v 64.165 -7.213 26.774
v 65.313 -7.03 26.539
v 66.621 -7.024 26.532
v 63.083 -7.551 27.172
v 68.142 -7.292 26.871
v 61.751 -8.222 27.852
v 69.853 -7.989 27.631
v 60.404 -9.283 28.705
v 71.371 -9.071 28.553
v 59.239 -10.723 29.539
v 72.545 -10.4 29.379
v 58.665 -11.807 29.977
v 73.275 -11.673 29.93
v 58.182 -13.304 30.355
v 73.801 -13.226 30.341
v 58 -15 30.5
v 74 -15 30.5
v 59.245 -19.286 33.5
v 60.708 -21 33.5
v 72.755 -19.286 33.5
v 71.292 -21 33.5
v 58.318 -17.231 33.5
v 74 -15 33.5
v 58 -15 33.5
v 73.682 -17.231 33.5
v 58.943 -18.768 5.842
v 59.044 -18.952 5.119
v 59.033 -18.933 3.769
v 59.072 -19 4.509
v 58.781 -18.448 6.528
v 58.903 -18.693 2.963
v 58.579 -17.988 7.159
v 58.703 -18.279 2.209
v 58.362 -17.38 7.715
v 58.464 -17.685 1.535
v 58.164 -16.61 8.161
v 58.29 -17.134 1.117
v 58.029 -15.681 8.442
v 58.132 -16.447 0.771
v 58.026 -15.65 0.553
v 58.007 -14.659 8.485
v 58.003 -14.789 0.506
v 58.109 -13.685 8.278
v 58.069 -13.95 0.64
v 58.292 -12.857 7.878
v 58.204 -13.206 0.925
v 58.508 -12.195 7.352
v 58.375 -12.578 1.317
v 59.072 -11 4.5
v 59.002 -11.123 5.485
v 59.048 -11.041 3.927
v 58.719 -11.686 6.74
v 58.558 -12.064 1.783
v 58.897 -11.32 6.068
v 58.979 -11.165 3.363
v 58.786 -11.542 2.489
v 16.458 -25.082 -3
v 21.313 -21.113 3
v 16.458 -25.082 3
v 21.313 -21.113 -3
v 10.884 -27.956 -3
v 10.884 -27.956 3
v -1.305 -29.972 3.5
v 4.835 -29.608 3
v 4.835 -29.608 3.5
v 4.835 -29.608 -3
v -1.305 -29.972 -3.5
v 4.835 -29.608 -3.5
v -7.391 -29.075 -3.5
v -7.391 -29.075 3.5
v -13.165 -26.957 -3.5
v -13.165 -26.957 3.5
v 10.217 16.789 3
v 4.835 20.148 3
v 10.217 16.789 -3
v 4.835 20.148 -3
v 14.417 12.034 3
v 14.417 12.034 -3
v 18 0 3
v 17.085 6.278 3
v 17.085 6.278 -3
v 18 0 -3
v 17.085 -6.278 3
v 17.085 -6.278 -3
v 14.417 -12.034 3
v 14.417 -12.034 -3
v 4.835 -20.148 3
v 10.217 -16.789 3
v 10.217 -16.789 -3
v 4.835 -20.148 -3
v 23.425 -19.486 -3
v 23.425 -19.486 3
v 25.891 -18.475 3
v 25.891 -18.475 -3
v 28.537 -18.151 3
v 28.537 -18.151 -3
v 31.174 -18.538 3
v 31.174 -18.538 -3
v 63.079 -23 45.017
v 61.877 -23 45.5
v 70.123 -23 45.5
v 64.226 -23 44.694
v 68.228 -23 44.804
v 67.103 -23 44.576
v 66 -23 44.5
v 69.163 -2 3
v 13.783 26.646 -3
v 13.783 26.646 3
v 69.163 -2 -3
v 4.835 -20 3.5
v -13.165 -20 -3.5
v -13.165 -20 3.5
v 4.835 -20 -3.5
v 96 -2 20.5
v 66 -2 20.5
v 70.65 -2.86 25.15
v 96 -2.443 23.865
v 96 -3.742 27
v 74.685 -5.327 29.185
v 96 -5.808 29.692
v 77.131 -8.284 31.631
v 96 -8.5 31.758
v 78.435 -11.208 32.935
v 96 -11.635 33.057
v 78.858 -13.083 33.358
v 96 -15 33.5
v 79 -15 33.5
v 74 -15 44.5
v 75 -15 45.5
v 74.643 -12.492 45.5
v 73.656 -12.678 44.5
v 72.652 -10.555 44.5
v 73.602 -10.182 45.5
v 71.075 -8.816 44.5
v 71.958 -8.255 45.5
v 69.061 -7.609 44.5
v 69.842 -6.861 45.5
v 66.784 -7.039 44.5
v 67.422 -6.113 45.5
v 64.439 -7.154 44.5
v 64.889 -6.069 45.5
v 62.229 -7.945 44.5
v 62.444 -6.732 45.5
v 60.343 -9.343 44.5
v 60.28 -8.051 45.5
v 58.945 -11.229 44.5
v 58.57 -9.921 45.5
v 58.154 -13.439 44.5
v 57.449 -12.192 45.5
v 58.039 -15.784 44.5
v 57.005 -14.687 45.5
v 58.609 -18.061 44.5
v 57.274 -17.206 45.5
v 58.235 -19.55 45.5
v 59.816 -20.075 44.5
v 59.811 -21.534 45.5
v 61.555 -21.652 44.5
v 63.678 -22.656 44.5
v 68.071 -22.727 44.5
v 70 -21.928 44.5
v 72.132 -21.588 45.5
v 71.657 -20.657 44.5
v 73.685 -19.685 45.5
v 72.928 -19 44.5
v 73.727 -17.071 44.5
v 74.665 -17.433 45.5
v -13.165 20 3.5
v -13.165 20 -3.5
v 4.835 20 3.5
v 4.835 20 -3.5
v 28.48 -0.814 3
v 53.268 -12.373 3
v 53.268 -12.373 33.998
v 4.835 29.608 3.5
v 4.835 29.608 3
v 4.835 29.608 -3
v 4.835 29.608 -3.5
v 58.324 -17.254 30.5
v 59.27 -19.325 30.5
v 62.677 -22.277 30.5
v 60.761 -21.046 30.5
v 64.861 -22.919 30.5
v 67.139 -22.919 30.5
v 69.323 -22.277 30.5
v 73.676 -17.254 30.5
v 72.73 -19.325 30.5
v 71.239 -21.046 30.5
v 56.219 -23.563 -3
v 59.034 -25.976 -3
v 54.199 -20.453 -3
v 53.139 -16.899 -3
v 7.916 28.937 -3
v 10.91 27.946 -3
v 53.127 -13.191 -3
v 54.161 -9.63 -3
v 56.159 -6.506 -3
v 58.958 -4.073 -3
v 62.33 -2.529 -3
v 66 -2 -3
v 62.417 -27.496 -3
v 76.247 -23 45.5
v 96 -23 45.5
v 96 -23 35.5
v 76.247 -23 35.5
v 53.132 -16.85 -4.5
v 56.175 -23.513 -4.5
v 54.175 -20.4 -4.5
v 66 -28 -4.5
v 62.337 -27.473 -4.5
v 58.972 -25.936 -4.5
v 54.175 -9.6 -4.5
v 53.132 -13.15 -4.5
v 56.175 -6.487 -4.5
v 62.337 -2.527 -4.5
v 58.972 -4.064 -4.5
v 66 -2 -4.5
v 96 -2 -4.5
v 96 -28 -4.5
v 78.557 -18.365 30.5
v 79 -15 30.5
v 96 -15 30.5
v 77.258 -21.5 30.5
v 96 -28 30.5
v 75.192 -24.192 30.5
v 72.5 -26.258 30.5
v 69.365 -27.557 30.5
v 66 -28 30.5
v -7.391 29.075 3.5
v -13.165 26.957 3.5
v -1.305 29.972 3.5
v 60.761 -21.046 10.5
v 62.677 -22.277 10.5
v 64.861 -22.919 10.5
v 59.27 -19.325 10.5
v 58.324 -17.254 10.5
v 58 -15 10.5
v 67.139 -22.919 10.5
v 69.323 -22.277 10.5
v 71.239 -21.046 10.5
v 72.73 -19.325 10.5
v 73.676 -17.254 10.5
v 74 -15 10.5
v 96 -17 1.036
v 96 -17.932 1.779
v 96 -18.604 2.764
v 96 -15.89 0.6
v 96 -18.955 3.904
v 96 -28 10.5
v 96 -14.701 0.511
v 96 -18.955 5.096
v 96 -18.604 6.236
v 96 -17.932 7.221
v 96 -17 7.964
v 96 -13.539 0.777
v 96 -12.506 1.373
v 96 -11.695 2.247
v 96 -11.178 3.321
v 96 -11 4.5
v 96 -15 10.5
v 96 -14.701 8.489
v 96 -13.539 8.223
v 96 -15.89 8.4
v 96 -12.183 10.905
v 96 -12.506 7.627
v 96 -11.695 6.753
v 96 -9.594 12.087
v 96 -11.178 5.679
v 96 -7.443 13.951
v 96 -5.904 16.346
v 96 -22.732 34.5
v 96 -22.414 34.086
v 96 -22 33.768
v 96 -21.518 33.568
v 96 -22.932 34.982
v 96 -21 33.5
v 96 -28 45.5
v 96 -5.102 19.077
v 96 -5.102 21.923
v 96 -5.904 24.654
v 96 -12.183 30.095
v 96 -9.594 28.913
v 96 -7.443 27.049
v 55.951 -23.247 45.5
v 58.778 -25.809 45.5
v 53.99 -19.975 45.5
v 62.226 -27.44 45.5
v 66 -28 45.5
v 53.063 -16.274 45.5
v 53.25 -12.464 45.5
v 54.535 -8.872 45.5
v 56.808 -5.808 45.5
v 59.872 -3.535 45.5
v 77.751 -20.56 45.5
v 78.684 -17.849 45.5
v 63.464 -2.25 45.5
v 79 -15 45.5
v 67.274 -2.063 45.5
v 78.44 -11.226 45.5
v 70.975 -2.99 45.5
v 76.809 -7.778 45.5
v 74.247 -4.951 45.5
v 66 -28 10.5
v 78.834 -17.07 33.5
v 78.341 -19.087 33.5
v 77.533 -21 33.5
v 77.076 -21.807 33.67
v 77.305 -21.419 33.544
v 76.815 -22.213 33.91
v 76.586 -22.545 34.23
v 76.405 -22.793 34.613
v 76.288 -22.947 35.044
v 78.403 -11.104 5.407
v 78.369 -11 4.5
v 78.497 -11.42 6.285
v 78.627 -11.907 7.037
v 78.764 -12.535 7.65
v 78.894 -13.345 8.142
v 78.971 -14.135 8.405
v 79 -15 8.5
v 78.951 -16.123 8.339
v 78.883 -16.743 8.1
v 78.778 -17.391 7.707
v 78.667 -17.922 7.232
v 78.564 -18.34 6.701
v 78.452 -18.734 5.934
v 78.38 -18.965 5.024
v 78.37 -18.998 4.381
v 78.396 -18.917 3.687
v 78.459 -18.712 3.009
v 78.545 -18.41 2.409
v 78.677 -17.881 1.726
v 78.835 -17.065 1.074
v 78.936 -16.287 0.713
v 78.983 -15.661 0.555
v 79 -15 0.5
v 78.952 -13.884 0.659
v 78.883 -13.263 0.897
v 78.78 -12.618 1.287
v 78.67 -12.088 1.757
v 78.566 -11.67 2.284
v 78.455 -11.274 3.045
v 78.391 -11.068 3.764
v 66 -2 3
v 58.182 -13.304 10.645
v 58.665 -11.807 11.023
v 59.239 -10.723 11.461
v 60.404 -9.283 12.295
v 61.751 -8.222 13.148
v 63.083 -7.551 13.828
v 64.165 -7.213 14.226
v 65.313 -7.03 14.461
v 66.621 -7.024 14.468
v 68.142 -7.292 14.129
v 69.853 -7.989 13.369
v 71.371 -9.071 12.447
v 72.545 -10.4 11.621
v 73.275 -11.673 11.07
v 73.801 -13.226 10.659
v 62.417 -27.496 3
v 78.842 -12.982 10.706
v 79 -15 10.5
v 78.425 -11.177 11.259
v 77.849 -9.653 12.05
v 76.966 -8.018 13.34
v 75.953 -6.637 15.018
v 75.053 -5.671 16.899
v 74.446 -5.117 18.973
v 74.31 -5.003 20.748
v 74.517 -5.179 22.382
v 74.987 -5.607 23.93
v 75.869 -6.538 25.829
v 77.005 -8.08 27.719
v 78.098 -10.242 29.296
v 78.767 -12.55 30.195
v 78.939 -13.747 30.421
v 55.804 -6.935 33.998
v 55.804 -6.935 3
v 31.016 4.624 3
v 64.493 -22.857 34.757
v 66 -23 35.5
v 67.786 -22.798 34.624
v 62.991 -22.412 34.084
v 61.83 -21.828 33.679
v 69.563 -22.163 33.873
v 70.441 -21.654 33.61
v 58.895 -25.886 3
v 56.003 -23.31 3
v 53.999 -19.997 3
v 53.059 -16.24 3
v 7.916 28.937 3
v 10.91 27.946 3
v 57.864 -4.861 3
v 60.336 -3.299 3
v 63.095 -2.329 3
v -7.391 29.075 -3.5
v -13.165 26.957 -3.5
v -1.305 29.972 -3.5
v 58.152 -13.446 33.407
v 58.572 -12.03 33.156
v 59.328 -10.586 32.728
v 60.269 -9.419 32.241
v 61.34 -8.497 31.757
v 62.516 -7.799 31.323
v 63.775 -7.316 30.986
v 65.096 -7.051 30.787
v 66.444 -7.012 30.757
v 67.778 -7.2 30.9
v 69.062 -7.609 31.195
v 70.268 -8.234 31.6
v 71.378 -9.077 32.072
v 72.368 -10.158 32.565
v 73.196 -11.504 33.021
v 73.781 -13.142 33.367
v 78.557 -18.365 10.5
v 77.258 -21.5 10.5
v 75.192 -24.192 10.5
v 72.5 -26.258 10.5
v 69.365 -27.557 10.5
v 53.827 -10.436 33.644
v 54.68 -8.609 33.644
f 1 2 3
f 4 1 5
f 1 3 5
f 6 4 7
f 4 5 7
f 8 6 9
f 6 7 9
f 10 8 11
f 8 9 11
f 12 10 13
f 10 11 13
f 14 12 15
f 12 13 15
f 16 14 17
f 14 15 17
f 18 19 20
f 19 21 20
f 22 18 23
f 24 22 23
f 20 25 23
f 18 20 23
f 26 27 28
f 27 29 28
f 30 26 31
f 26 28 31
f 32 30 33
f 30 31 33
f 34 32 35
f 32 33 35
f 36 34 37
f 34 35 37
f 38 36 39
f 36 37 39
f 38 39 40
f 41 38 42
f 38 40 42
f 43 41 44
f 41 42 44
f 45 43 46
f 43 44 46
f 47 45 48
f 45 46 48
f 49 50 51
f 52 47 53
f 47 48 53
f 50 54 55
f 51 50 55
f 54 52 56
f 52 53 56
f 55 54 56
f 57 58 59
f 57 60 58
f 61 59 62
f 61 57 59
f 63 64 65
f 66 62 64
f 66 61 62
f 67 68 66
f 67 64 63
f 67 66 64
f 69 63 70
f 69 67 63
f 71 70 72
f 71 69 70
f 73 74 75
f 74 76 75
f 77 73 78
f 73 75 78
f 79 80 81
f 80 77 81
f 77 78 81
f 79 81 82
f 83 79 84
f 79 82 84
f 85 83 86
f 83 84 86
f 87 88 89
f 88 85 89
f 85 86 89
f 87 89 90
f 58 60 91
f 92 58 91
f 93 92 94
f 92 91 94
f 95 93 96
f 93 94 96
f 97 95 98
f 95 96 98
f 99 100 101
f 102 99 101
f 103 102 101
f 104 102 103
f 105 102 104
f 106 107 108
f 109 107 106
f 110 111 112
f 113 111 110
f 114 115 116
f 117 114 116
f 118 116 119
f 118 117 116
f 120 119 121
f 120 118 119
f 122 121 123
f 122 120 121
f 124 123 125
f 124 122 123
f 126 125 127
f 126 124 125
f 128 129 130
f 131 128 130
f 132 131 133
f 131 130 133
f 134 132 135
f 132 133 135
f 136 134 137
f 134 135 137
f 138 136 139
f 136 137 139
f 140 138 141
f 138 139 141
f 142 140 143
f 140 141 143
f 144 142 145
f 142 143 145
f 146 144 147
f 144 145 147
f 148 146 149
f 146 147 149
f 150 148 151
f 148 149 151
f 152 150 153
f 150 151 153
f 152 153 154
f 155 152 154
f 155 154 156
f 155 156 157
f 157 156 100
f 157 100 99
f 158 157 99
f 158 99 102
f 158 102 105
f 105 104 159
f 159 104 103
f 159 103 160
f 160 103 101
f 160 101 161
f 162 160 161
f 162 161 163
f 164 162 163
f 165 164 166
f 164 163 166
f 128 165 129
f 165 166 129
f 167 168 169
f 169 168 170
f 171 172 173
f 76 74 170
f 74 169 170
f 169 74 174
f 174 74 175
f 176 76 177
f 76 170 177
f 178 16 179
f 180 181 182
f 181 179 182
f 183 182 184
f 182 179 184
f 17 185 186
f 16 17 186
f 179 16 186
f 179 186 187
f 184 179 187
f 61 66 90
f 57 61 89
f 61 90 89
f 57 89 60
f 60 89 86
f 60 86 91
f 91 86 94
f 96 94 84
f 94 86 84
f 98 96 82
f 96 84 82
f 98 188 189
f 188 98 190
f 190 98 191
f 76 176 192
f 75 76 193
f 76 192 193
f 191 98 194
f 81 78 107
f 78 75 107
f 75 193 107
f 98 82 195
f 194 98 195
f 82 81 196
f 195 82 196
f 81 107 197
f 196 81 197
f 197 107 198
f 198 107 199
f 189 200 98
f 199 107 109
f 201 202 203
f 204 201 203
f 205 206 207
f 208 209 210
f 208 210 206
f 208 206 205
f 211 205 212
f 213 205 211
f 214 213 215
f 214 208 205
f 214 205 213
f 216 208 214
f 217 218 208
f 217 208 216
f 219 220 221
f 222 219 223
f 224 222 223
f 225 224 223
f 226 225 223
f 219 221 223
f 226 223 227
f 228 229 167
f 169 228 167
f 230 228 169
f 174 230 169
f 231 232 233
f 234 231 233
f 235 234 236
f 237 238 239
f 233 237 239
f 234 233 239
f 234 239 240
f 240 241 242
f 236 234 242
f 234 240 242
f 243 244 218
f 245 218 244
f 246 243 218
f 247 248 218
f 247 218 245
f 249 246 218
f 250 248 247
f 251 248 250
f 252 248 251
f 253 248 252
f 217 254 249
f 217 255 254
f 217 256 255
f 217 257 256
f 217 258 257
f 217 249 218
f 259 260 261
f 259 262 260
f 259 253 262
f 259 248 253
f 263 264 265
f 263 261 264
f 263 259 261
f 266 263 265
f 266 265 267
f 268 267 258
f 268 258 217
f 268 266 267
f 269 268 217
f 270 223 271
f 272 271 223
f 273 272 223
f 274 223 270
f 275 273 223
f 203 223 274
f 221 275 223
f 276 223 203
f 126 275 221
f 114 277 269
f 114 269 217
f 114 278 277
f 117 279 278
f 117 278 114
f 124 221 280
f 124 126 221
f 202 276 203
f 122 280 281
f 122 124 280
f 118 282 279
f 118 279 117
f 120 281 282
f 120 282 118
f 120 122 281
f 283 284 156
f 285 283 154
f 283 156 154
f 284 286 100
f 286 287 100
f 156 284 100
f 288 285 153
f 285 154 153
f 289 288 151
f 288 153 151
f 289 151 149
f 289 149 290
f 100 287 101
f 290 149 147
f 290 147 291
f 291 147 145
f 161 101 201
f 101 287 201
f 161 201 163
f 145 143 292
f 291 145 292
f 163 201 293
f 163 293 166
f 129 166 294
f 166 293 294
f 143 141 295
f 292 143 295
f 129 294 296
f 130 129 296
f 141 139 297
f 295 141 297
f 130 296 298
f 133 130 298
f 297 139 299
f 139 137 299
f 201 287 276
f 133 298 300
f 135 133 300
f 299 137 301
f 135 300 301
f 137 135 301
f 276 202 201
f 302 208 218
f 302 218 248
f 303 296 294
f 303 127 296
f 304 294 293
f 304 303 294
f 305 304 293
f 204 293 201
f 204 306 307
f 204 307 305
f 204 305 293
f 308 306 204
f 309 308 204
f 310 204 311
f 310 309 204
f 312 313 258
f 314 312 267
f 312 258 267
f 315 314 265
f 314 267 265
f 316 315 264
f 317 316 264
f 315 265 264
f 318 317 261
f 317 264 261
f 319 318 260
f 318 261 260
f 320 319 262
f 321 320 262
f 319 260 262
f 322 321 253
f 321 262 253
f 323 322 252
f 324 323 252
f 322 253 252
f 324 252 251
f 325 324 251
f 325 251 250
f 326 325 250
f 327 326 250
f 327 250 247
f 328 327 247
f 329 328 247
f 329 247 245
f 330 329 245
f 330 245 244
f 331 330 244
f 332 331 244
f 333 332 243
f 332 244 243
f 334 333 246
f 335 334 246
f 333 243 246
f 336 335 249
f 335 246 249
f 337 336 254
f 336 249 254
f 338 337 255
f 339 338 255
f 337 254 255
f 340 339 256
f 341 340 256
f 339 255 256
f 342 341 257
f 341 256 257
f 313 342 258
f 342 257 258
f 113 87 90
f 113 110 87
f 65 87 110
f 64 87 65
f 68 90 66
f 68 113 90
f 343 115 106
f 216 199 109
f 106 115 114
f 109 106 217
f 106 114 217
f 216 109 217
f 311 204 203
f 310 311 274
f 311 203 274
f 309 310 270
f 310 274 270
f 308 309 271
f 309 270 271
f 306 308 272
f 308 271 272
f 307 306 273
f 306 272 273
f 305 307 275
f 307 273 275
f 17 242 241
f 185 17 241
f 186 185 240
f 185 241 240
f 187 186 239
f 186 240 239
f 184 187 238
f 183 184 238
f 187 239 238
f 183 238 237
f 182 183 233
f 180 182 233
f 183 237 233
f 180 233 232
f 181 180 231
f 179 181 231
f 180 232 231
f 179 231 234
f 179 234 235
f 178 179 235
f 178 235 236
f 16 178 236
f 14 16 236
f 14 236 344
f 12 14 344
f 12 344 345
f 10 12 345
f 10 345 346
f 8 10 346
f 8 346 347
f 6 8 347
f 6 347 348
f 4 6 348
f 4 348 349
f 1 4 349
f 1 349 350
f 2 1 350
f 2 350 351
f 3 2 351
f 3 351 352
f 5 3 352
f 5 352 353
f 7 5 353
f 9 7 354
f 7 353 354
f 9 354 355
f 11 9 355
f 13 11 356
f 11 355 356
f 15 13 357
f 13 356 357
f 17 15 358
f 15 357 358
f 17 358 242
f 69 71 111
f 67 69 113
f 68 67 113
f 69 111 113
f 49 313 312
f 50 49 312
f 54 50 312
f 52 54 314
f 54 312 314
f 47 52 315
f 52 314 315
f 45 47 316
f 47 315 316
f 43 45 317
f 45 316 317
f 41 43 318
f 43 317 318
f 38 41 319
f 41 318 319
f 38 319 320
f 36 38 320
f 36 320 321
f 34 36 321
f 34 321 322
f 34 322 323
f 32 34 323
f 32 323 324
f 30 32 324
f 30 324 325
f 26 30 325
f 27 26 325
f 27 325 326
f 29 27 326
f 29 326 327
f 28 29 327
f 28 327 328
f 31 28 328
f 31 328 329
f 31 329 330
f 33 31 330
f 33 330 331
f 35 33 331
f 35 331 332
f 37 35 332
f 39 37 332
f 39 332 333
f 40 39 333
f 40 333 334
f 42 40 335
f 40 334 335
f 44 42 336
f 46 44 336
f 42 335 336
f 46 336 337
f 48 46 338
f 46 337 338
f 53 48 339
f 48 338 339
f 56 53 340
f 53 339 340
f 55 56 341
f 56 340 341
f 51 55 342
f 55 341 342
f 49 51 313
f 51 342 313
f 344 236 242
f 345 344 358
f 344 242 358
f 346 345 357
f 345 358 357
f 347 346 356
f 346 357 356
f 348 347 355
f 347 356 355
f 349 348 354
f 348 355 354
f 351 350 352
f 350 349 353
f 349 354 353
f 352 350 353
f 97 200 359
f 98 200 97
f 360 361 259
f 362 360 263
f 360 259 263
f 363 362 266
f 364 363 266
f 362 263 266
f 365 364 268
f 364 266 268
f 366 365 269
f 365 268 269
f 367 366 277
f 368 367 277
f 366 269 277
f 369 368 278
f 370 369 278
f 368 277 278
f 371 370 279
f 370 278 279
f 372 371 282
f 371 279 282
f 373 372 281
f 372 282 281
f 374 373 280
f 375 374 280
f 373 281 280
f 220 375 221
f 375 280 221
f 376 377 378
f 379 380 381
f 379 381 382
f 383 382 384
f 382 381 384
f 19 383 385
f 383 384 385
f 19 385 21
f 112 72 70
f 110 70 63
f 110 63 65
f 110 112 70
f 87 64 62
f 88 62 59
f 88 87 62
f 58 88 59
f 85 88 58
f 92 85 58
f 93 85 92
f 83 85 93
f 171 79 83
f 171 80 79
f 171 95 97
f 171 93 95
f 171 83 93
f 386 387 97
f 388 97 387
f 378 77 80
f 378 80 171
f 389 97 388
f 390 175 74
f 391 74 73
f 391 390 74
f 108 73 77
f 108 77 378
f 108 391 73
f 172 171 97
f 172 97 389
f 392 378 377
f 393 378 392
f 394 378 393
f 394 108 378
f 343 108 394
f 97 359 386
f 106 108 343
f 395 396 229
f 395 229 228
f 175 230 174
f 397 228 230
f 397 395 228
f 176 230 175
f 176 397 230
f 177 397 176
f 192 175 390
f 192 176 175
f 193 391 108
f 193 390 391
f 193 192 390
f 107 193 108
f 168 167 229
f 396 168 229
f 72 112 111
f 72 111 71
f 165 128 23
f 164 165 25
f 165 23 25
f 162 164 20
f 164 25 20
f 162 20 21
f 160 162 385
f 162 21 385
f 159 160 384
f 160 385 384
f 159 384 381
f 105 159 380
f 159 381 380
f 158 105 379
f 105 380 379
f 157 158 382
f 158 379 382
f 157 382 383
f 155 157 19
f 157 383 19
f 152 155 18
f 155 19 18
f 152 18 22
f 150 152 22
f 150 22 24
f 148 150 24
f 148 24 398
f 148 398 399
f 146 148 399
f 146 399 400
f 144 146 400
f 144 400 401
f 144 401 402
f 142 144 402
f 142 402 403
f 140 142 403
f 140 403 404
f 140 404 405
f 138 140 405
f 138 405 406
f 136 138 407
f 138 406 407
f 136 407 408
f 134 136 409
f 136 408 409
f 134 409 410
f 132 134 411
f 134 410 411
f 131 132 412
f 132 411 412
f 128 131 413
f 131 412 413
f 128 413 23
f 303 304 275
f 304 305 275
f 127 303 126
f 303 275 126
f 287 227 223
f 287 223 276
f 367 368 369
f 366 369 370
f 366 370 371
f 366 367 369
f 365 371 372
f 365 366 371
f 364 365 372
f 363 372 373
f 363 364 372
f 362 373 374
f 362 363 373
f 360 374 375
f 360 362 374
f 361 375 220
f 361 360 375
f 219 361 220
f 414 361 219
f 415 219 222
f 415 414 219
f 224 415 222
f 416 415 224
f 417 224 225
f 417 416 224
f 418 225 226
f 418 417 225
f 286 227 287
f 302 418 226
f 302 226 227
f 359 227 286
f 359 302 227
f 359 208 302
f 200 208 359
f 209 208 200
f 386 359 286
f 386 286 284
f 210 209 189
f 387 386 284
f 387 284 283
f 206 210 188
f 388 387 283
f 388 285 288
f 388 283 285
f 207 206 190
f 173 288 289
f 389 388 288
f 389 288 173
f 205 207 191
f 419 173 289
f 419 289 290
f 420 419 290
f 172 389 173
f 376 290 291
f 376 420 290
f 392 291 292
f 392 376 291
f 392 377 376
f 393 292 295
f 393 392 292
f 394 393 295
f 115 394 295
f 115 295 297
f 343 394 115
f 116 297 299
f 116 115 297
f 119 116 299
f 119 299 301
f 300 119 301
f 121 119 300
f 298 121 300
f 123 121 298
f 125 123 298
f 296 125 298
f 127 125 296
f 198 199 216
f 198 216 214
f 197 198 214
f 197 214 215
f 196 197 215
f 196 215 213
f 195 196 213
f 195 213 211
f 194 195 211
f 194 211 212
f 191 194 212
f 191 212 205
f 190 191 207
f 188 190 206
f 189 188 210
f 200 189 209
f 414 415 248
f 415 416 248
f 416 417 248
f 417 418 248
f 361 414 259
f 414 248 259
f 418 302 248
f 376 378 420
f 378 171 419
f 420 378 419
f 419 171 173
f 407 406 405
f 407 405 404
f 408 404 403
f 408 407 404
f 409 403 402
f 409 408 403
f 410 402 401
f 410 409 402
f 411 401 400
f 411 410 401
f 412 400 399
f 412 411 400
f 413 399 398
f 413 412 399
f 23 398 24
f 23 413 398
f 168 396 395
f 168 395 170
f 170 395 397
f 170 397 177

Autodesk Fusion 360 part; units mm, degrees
sketch "草图1" plane through (0, 0, 0) normal (0, 0, 1) x (1, 0, 0)
  line L0 (-13.1652, 20) -> (4.8348, 20)
  line L1 (-13.1652, -20) -> (4.8348, -20)
  line L2 (-40, 0) -> (55, 0) construction
  line L3 (-13.1652, 20) -> (-13.1652, 26.957)
  line L4 (-13.1652, -20) -> (-13.1652, -26.957)
  line L5 (-13.1652, -20) -> (4.8348, -20)
  line L6 (4.8348, -20) -> (4.8348, -29.6078)
  line L7 (4.8348, 20) -> (4.8348, 29.6078)
  arc A0 (-13.1652, -26.957) -> (-13.1652, 26.957) centre (0, 0) ccw
  arc A1 (4.8348, -20.1481) -> (4.8348, 20.1481) centre (-4, 0) ccw
  line L8 (13.7832, 26.6462) -> (71.9727, -3.4533)
  line L9 (62.4167, -27.4964) -> (31.174, -18.5377)
  arc A2 (31.174, -18.5377) -> (21.3132, -21.1127) centre (28.4176, -28.1503) ccw
  circle A3 centre (66, -15) radius 13
  circle A4 centre (66, -15) radius 8
  point P0 (66, -15)
  dimension "d5" = 60
  dimension "d6" = 44
  dimension "d7" = 4
  dimension "d8" = 20
  dimension "d9" = 40
  dimension "d10" = 18
  dimension "d11" = 18
  dimension "d13" = 15
  dimension "d14" = 10
  dimension "d16" = 70
  dimension "d17" = 26
  dimension "d18" = 16
  dimension "d19" = 16
extrude "拉伸1" add sketch "草图1" along normal mid plane 7 contours L0 L3 L7 A0 | L1 L4 L5 L6 A0 makes body 1 at (-4.8402, -23.1181, 3.5) makes body 2 at (-4.8402, 23.1181, 3.5)
extrude "拉伸2" add sketch "草图1" along normal mid plane 6 contours L6 L7 A0 A1 | A0 L8 L9 A2 A3 bodies 1 2
extrude "拉伸3" add sketch "草图1" along normal blind 45.5 and the other way blind 4.5 contours A3 bodies 1
chamfer "倒角1" distance 1 angle 45 1 edges at (58.5414, -12.1071, 45.5) measured on face at (77.2551, -13.9567, 45.5) on bodies 1
ref_plane "工作平面1" through (66, 0, 0) normal (1, 0, 0) x (0, 1, 0)
sketch "草图2" plane through (66, 0, 0) normal (1, 0, 0) x (0, 1, 0)
  line L0 (-28, -4.5) -> (-2, -4.5)
  line L1 (-2, 45.5) -> (-28, 45.5)
  line L2 (-28, 45.5) -> (-23, 45.5)
  line L3 (-23, 45.5) -> (-23, 35.5)
  arc A0 (-23, 35.5) -> (-21, 33.5) centre (-21, 35.5) ccw
  line L4 (-21, 33.5) -> (-15, 33.5)
  arc A1 (-2, 20.5) -> (-15, 33.5) centre (-15, 20.5) ccw
  line L5 (-2, 20.5) -> (-2, -4.5)
  line L6 (-28, -4.5) -> (-28, 10.5)
  line L7 (-28, 10.5) -> (-15, 10.5)
  arc A2 (-15, 10.5) -> (-15, 30.5) centre (-15, 20.5) ccw
  line L8 (-15, 30.5) -> (-28, 30.5)
  line L9 (-28, 30.5) -> (-28, 45.5)
  circle A3 centre (-15, 4.5) radius 4
  point P0 (-15, 45.5)
  point P1 (-15, -4.5)
  dimension "d31" = 5
  dimension "d32" = 2
  dimension "d33" = 10
  dimension "d34" = 13
  dimension "d35" = 25
  dimension "d36" = 8
  dimension "d37" = 9
ref_plane "工作平面2" through (96, 0, 0) normal (1, 0, 0) x (0, 1, 0)
sketch "草图3" plane through (96, 0, 0) normal (1, 0, 0) x (0, 1, 0)
  line L0 (-28, -4.5) -> (-28, 10.5)
  line L1 (-28, 10.5) -> (-15, 10.5)
  arc A0 (-15, 10.5) -> (-15, 30.5) centre (-15, 20.5) ccw
  line L2 (-15, 30.5) -> (-28, 30.5)
  line L3 (-28, 45.5) -> (-23, 45.5)
  arc A1 (-23, 35.5) -> (-21, 33.5) centre (-21, 35.5) ccw
  line L4 (-21, 33.5) -> (-15, 33.5)
  arc A2 (-2, 20.5) -> (-15, 33.5) centre (-15, 20.5) ccw
  line L5 (-2, 20.5) -> (-2, -4.5)
  line L6 (-23, 45.5) -> (-23, 35.5)
  line L7 (-28, -4.5) -> (-2, -4.5)
  circle A3 centre (-15, 4.5) radius 4
  line L8 (-28, 30.5) -> (-28, 45.5)
extrude "拉伸4" add sketch "草图3" along normal up to surface end surface at (64.148, -27.8674, 14.6667) on bodies 1 bodies 1
extrude "拉伸5" cut sketch "草图3" along normal up to surface contours A3 end surface at (66.8152, -22.9584, 38.2852) on bodies 1 bodies 1
sketch "草图4" plane through (0, 0, 3) normal (0, 0, 1) x (-1, 0, 0)
  line L0 (-66, 2) -> (-69.1632, 2)
  line L1 (-69.1632, 2) -> (-13.7832, -26.6462)
  arc A0 (-13.7832, -26.6462) -> (-4.8348, -29.6078) centre (0, 0) ccw
  line L2 (-4.8348, -29.6078) -> (-4.8348, -20.1481)
  arc A1 (-4.8348, 20.1481) -> (-4.8348, -20.1481) centre (4, 0) ccw
  line L3 (-4.8348, 20.1481) -> (-4.8348, 29.6078)
  arc A2 (-4.8348, 29.6078) -> (-21.3132, 21.1127) centre (0, 0) ccw
  arc A3 (-31.174, 18.5377) -> (-21.3132, 21.1127) centre (-28.4176, 28.1503) ccw
  line L4 (-31.174, 18.5377) -> (-62.4167, 27.4964)
  arc A4 (-66, 2) -> (-62.4167, 27.4964) centre (-66, 15) ccw
  line L5 (-66, 15) -> (-28.1042, -2.6711)
  line L6 (0, 0) -> (-100, 0) construction
  dimension "d43" = 25
sketch "草图5" plane through (0, 0, 45.5) normal (0, 0, 1) x (-1, 0, 0)
  arc A0 (-76.247, 23) -> (-66, 28) centre (-66, 15) ccw
  line L0 (-66, 28) -> (-96, 28)
  line L1 (-96, 28) -> (-96, 23)
  line L2 (-96, 23) -> (-76.247, 23)
  circle A1 centre (-66, 15) radius 9
  point P0 (-66, 15)
ref_plane "工作平面3" through (66, -15, 45.5) normal (0.4226, 0.9063, 0) x (-0.9063, 0.4226, 0)
sketch "草图6" plane through (6.0427, 12.9586, 0) normal (0.4226, 0.9063, 0) x (-0.9063, 0.4226, 0)
  line L0 (-26.1556, 3) -> (-56.1556, 37)
  line L1 (-56.1556, 37) -> (-56.1556, 3)
  line L2 (-56.1556, 3) -> (-26.1556, 3)
  point P0 (-66.1556, 45.5)
  point P1 (-66.1556, 3)
  point P2 (-24.3421, 3)
  dimension "d44" = 40
  dimension "d45" = 34
  dimension "d46" = 30
extrude "拉伸6" add sketch "草图6" along normal mid plane 6 bodies 1
